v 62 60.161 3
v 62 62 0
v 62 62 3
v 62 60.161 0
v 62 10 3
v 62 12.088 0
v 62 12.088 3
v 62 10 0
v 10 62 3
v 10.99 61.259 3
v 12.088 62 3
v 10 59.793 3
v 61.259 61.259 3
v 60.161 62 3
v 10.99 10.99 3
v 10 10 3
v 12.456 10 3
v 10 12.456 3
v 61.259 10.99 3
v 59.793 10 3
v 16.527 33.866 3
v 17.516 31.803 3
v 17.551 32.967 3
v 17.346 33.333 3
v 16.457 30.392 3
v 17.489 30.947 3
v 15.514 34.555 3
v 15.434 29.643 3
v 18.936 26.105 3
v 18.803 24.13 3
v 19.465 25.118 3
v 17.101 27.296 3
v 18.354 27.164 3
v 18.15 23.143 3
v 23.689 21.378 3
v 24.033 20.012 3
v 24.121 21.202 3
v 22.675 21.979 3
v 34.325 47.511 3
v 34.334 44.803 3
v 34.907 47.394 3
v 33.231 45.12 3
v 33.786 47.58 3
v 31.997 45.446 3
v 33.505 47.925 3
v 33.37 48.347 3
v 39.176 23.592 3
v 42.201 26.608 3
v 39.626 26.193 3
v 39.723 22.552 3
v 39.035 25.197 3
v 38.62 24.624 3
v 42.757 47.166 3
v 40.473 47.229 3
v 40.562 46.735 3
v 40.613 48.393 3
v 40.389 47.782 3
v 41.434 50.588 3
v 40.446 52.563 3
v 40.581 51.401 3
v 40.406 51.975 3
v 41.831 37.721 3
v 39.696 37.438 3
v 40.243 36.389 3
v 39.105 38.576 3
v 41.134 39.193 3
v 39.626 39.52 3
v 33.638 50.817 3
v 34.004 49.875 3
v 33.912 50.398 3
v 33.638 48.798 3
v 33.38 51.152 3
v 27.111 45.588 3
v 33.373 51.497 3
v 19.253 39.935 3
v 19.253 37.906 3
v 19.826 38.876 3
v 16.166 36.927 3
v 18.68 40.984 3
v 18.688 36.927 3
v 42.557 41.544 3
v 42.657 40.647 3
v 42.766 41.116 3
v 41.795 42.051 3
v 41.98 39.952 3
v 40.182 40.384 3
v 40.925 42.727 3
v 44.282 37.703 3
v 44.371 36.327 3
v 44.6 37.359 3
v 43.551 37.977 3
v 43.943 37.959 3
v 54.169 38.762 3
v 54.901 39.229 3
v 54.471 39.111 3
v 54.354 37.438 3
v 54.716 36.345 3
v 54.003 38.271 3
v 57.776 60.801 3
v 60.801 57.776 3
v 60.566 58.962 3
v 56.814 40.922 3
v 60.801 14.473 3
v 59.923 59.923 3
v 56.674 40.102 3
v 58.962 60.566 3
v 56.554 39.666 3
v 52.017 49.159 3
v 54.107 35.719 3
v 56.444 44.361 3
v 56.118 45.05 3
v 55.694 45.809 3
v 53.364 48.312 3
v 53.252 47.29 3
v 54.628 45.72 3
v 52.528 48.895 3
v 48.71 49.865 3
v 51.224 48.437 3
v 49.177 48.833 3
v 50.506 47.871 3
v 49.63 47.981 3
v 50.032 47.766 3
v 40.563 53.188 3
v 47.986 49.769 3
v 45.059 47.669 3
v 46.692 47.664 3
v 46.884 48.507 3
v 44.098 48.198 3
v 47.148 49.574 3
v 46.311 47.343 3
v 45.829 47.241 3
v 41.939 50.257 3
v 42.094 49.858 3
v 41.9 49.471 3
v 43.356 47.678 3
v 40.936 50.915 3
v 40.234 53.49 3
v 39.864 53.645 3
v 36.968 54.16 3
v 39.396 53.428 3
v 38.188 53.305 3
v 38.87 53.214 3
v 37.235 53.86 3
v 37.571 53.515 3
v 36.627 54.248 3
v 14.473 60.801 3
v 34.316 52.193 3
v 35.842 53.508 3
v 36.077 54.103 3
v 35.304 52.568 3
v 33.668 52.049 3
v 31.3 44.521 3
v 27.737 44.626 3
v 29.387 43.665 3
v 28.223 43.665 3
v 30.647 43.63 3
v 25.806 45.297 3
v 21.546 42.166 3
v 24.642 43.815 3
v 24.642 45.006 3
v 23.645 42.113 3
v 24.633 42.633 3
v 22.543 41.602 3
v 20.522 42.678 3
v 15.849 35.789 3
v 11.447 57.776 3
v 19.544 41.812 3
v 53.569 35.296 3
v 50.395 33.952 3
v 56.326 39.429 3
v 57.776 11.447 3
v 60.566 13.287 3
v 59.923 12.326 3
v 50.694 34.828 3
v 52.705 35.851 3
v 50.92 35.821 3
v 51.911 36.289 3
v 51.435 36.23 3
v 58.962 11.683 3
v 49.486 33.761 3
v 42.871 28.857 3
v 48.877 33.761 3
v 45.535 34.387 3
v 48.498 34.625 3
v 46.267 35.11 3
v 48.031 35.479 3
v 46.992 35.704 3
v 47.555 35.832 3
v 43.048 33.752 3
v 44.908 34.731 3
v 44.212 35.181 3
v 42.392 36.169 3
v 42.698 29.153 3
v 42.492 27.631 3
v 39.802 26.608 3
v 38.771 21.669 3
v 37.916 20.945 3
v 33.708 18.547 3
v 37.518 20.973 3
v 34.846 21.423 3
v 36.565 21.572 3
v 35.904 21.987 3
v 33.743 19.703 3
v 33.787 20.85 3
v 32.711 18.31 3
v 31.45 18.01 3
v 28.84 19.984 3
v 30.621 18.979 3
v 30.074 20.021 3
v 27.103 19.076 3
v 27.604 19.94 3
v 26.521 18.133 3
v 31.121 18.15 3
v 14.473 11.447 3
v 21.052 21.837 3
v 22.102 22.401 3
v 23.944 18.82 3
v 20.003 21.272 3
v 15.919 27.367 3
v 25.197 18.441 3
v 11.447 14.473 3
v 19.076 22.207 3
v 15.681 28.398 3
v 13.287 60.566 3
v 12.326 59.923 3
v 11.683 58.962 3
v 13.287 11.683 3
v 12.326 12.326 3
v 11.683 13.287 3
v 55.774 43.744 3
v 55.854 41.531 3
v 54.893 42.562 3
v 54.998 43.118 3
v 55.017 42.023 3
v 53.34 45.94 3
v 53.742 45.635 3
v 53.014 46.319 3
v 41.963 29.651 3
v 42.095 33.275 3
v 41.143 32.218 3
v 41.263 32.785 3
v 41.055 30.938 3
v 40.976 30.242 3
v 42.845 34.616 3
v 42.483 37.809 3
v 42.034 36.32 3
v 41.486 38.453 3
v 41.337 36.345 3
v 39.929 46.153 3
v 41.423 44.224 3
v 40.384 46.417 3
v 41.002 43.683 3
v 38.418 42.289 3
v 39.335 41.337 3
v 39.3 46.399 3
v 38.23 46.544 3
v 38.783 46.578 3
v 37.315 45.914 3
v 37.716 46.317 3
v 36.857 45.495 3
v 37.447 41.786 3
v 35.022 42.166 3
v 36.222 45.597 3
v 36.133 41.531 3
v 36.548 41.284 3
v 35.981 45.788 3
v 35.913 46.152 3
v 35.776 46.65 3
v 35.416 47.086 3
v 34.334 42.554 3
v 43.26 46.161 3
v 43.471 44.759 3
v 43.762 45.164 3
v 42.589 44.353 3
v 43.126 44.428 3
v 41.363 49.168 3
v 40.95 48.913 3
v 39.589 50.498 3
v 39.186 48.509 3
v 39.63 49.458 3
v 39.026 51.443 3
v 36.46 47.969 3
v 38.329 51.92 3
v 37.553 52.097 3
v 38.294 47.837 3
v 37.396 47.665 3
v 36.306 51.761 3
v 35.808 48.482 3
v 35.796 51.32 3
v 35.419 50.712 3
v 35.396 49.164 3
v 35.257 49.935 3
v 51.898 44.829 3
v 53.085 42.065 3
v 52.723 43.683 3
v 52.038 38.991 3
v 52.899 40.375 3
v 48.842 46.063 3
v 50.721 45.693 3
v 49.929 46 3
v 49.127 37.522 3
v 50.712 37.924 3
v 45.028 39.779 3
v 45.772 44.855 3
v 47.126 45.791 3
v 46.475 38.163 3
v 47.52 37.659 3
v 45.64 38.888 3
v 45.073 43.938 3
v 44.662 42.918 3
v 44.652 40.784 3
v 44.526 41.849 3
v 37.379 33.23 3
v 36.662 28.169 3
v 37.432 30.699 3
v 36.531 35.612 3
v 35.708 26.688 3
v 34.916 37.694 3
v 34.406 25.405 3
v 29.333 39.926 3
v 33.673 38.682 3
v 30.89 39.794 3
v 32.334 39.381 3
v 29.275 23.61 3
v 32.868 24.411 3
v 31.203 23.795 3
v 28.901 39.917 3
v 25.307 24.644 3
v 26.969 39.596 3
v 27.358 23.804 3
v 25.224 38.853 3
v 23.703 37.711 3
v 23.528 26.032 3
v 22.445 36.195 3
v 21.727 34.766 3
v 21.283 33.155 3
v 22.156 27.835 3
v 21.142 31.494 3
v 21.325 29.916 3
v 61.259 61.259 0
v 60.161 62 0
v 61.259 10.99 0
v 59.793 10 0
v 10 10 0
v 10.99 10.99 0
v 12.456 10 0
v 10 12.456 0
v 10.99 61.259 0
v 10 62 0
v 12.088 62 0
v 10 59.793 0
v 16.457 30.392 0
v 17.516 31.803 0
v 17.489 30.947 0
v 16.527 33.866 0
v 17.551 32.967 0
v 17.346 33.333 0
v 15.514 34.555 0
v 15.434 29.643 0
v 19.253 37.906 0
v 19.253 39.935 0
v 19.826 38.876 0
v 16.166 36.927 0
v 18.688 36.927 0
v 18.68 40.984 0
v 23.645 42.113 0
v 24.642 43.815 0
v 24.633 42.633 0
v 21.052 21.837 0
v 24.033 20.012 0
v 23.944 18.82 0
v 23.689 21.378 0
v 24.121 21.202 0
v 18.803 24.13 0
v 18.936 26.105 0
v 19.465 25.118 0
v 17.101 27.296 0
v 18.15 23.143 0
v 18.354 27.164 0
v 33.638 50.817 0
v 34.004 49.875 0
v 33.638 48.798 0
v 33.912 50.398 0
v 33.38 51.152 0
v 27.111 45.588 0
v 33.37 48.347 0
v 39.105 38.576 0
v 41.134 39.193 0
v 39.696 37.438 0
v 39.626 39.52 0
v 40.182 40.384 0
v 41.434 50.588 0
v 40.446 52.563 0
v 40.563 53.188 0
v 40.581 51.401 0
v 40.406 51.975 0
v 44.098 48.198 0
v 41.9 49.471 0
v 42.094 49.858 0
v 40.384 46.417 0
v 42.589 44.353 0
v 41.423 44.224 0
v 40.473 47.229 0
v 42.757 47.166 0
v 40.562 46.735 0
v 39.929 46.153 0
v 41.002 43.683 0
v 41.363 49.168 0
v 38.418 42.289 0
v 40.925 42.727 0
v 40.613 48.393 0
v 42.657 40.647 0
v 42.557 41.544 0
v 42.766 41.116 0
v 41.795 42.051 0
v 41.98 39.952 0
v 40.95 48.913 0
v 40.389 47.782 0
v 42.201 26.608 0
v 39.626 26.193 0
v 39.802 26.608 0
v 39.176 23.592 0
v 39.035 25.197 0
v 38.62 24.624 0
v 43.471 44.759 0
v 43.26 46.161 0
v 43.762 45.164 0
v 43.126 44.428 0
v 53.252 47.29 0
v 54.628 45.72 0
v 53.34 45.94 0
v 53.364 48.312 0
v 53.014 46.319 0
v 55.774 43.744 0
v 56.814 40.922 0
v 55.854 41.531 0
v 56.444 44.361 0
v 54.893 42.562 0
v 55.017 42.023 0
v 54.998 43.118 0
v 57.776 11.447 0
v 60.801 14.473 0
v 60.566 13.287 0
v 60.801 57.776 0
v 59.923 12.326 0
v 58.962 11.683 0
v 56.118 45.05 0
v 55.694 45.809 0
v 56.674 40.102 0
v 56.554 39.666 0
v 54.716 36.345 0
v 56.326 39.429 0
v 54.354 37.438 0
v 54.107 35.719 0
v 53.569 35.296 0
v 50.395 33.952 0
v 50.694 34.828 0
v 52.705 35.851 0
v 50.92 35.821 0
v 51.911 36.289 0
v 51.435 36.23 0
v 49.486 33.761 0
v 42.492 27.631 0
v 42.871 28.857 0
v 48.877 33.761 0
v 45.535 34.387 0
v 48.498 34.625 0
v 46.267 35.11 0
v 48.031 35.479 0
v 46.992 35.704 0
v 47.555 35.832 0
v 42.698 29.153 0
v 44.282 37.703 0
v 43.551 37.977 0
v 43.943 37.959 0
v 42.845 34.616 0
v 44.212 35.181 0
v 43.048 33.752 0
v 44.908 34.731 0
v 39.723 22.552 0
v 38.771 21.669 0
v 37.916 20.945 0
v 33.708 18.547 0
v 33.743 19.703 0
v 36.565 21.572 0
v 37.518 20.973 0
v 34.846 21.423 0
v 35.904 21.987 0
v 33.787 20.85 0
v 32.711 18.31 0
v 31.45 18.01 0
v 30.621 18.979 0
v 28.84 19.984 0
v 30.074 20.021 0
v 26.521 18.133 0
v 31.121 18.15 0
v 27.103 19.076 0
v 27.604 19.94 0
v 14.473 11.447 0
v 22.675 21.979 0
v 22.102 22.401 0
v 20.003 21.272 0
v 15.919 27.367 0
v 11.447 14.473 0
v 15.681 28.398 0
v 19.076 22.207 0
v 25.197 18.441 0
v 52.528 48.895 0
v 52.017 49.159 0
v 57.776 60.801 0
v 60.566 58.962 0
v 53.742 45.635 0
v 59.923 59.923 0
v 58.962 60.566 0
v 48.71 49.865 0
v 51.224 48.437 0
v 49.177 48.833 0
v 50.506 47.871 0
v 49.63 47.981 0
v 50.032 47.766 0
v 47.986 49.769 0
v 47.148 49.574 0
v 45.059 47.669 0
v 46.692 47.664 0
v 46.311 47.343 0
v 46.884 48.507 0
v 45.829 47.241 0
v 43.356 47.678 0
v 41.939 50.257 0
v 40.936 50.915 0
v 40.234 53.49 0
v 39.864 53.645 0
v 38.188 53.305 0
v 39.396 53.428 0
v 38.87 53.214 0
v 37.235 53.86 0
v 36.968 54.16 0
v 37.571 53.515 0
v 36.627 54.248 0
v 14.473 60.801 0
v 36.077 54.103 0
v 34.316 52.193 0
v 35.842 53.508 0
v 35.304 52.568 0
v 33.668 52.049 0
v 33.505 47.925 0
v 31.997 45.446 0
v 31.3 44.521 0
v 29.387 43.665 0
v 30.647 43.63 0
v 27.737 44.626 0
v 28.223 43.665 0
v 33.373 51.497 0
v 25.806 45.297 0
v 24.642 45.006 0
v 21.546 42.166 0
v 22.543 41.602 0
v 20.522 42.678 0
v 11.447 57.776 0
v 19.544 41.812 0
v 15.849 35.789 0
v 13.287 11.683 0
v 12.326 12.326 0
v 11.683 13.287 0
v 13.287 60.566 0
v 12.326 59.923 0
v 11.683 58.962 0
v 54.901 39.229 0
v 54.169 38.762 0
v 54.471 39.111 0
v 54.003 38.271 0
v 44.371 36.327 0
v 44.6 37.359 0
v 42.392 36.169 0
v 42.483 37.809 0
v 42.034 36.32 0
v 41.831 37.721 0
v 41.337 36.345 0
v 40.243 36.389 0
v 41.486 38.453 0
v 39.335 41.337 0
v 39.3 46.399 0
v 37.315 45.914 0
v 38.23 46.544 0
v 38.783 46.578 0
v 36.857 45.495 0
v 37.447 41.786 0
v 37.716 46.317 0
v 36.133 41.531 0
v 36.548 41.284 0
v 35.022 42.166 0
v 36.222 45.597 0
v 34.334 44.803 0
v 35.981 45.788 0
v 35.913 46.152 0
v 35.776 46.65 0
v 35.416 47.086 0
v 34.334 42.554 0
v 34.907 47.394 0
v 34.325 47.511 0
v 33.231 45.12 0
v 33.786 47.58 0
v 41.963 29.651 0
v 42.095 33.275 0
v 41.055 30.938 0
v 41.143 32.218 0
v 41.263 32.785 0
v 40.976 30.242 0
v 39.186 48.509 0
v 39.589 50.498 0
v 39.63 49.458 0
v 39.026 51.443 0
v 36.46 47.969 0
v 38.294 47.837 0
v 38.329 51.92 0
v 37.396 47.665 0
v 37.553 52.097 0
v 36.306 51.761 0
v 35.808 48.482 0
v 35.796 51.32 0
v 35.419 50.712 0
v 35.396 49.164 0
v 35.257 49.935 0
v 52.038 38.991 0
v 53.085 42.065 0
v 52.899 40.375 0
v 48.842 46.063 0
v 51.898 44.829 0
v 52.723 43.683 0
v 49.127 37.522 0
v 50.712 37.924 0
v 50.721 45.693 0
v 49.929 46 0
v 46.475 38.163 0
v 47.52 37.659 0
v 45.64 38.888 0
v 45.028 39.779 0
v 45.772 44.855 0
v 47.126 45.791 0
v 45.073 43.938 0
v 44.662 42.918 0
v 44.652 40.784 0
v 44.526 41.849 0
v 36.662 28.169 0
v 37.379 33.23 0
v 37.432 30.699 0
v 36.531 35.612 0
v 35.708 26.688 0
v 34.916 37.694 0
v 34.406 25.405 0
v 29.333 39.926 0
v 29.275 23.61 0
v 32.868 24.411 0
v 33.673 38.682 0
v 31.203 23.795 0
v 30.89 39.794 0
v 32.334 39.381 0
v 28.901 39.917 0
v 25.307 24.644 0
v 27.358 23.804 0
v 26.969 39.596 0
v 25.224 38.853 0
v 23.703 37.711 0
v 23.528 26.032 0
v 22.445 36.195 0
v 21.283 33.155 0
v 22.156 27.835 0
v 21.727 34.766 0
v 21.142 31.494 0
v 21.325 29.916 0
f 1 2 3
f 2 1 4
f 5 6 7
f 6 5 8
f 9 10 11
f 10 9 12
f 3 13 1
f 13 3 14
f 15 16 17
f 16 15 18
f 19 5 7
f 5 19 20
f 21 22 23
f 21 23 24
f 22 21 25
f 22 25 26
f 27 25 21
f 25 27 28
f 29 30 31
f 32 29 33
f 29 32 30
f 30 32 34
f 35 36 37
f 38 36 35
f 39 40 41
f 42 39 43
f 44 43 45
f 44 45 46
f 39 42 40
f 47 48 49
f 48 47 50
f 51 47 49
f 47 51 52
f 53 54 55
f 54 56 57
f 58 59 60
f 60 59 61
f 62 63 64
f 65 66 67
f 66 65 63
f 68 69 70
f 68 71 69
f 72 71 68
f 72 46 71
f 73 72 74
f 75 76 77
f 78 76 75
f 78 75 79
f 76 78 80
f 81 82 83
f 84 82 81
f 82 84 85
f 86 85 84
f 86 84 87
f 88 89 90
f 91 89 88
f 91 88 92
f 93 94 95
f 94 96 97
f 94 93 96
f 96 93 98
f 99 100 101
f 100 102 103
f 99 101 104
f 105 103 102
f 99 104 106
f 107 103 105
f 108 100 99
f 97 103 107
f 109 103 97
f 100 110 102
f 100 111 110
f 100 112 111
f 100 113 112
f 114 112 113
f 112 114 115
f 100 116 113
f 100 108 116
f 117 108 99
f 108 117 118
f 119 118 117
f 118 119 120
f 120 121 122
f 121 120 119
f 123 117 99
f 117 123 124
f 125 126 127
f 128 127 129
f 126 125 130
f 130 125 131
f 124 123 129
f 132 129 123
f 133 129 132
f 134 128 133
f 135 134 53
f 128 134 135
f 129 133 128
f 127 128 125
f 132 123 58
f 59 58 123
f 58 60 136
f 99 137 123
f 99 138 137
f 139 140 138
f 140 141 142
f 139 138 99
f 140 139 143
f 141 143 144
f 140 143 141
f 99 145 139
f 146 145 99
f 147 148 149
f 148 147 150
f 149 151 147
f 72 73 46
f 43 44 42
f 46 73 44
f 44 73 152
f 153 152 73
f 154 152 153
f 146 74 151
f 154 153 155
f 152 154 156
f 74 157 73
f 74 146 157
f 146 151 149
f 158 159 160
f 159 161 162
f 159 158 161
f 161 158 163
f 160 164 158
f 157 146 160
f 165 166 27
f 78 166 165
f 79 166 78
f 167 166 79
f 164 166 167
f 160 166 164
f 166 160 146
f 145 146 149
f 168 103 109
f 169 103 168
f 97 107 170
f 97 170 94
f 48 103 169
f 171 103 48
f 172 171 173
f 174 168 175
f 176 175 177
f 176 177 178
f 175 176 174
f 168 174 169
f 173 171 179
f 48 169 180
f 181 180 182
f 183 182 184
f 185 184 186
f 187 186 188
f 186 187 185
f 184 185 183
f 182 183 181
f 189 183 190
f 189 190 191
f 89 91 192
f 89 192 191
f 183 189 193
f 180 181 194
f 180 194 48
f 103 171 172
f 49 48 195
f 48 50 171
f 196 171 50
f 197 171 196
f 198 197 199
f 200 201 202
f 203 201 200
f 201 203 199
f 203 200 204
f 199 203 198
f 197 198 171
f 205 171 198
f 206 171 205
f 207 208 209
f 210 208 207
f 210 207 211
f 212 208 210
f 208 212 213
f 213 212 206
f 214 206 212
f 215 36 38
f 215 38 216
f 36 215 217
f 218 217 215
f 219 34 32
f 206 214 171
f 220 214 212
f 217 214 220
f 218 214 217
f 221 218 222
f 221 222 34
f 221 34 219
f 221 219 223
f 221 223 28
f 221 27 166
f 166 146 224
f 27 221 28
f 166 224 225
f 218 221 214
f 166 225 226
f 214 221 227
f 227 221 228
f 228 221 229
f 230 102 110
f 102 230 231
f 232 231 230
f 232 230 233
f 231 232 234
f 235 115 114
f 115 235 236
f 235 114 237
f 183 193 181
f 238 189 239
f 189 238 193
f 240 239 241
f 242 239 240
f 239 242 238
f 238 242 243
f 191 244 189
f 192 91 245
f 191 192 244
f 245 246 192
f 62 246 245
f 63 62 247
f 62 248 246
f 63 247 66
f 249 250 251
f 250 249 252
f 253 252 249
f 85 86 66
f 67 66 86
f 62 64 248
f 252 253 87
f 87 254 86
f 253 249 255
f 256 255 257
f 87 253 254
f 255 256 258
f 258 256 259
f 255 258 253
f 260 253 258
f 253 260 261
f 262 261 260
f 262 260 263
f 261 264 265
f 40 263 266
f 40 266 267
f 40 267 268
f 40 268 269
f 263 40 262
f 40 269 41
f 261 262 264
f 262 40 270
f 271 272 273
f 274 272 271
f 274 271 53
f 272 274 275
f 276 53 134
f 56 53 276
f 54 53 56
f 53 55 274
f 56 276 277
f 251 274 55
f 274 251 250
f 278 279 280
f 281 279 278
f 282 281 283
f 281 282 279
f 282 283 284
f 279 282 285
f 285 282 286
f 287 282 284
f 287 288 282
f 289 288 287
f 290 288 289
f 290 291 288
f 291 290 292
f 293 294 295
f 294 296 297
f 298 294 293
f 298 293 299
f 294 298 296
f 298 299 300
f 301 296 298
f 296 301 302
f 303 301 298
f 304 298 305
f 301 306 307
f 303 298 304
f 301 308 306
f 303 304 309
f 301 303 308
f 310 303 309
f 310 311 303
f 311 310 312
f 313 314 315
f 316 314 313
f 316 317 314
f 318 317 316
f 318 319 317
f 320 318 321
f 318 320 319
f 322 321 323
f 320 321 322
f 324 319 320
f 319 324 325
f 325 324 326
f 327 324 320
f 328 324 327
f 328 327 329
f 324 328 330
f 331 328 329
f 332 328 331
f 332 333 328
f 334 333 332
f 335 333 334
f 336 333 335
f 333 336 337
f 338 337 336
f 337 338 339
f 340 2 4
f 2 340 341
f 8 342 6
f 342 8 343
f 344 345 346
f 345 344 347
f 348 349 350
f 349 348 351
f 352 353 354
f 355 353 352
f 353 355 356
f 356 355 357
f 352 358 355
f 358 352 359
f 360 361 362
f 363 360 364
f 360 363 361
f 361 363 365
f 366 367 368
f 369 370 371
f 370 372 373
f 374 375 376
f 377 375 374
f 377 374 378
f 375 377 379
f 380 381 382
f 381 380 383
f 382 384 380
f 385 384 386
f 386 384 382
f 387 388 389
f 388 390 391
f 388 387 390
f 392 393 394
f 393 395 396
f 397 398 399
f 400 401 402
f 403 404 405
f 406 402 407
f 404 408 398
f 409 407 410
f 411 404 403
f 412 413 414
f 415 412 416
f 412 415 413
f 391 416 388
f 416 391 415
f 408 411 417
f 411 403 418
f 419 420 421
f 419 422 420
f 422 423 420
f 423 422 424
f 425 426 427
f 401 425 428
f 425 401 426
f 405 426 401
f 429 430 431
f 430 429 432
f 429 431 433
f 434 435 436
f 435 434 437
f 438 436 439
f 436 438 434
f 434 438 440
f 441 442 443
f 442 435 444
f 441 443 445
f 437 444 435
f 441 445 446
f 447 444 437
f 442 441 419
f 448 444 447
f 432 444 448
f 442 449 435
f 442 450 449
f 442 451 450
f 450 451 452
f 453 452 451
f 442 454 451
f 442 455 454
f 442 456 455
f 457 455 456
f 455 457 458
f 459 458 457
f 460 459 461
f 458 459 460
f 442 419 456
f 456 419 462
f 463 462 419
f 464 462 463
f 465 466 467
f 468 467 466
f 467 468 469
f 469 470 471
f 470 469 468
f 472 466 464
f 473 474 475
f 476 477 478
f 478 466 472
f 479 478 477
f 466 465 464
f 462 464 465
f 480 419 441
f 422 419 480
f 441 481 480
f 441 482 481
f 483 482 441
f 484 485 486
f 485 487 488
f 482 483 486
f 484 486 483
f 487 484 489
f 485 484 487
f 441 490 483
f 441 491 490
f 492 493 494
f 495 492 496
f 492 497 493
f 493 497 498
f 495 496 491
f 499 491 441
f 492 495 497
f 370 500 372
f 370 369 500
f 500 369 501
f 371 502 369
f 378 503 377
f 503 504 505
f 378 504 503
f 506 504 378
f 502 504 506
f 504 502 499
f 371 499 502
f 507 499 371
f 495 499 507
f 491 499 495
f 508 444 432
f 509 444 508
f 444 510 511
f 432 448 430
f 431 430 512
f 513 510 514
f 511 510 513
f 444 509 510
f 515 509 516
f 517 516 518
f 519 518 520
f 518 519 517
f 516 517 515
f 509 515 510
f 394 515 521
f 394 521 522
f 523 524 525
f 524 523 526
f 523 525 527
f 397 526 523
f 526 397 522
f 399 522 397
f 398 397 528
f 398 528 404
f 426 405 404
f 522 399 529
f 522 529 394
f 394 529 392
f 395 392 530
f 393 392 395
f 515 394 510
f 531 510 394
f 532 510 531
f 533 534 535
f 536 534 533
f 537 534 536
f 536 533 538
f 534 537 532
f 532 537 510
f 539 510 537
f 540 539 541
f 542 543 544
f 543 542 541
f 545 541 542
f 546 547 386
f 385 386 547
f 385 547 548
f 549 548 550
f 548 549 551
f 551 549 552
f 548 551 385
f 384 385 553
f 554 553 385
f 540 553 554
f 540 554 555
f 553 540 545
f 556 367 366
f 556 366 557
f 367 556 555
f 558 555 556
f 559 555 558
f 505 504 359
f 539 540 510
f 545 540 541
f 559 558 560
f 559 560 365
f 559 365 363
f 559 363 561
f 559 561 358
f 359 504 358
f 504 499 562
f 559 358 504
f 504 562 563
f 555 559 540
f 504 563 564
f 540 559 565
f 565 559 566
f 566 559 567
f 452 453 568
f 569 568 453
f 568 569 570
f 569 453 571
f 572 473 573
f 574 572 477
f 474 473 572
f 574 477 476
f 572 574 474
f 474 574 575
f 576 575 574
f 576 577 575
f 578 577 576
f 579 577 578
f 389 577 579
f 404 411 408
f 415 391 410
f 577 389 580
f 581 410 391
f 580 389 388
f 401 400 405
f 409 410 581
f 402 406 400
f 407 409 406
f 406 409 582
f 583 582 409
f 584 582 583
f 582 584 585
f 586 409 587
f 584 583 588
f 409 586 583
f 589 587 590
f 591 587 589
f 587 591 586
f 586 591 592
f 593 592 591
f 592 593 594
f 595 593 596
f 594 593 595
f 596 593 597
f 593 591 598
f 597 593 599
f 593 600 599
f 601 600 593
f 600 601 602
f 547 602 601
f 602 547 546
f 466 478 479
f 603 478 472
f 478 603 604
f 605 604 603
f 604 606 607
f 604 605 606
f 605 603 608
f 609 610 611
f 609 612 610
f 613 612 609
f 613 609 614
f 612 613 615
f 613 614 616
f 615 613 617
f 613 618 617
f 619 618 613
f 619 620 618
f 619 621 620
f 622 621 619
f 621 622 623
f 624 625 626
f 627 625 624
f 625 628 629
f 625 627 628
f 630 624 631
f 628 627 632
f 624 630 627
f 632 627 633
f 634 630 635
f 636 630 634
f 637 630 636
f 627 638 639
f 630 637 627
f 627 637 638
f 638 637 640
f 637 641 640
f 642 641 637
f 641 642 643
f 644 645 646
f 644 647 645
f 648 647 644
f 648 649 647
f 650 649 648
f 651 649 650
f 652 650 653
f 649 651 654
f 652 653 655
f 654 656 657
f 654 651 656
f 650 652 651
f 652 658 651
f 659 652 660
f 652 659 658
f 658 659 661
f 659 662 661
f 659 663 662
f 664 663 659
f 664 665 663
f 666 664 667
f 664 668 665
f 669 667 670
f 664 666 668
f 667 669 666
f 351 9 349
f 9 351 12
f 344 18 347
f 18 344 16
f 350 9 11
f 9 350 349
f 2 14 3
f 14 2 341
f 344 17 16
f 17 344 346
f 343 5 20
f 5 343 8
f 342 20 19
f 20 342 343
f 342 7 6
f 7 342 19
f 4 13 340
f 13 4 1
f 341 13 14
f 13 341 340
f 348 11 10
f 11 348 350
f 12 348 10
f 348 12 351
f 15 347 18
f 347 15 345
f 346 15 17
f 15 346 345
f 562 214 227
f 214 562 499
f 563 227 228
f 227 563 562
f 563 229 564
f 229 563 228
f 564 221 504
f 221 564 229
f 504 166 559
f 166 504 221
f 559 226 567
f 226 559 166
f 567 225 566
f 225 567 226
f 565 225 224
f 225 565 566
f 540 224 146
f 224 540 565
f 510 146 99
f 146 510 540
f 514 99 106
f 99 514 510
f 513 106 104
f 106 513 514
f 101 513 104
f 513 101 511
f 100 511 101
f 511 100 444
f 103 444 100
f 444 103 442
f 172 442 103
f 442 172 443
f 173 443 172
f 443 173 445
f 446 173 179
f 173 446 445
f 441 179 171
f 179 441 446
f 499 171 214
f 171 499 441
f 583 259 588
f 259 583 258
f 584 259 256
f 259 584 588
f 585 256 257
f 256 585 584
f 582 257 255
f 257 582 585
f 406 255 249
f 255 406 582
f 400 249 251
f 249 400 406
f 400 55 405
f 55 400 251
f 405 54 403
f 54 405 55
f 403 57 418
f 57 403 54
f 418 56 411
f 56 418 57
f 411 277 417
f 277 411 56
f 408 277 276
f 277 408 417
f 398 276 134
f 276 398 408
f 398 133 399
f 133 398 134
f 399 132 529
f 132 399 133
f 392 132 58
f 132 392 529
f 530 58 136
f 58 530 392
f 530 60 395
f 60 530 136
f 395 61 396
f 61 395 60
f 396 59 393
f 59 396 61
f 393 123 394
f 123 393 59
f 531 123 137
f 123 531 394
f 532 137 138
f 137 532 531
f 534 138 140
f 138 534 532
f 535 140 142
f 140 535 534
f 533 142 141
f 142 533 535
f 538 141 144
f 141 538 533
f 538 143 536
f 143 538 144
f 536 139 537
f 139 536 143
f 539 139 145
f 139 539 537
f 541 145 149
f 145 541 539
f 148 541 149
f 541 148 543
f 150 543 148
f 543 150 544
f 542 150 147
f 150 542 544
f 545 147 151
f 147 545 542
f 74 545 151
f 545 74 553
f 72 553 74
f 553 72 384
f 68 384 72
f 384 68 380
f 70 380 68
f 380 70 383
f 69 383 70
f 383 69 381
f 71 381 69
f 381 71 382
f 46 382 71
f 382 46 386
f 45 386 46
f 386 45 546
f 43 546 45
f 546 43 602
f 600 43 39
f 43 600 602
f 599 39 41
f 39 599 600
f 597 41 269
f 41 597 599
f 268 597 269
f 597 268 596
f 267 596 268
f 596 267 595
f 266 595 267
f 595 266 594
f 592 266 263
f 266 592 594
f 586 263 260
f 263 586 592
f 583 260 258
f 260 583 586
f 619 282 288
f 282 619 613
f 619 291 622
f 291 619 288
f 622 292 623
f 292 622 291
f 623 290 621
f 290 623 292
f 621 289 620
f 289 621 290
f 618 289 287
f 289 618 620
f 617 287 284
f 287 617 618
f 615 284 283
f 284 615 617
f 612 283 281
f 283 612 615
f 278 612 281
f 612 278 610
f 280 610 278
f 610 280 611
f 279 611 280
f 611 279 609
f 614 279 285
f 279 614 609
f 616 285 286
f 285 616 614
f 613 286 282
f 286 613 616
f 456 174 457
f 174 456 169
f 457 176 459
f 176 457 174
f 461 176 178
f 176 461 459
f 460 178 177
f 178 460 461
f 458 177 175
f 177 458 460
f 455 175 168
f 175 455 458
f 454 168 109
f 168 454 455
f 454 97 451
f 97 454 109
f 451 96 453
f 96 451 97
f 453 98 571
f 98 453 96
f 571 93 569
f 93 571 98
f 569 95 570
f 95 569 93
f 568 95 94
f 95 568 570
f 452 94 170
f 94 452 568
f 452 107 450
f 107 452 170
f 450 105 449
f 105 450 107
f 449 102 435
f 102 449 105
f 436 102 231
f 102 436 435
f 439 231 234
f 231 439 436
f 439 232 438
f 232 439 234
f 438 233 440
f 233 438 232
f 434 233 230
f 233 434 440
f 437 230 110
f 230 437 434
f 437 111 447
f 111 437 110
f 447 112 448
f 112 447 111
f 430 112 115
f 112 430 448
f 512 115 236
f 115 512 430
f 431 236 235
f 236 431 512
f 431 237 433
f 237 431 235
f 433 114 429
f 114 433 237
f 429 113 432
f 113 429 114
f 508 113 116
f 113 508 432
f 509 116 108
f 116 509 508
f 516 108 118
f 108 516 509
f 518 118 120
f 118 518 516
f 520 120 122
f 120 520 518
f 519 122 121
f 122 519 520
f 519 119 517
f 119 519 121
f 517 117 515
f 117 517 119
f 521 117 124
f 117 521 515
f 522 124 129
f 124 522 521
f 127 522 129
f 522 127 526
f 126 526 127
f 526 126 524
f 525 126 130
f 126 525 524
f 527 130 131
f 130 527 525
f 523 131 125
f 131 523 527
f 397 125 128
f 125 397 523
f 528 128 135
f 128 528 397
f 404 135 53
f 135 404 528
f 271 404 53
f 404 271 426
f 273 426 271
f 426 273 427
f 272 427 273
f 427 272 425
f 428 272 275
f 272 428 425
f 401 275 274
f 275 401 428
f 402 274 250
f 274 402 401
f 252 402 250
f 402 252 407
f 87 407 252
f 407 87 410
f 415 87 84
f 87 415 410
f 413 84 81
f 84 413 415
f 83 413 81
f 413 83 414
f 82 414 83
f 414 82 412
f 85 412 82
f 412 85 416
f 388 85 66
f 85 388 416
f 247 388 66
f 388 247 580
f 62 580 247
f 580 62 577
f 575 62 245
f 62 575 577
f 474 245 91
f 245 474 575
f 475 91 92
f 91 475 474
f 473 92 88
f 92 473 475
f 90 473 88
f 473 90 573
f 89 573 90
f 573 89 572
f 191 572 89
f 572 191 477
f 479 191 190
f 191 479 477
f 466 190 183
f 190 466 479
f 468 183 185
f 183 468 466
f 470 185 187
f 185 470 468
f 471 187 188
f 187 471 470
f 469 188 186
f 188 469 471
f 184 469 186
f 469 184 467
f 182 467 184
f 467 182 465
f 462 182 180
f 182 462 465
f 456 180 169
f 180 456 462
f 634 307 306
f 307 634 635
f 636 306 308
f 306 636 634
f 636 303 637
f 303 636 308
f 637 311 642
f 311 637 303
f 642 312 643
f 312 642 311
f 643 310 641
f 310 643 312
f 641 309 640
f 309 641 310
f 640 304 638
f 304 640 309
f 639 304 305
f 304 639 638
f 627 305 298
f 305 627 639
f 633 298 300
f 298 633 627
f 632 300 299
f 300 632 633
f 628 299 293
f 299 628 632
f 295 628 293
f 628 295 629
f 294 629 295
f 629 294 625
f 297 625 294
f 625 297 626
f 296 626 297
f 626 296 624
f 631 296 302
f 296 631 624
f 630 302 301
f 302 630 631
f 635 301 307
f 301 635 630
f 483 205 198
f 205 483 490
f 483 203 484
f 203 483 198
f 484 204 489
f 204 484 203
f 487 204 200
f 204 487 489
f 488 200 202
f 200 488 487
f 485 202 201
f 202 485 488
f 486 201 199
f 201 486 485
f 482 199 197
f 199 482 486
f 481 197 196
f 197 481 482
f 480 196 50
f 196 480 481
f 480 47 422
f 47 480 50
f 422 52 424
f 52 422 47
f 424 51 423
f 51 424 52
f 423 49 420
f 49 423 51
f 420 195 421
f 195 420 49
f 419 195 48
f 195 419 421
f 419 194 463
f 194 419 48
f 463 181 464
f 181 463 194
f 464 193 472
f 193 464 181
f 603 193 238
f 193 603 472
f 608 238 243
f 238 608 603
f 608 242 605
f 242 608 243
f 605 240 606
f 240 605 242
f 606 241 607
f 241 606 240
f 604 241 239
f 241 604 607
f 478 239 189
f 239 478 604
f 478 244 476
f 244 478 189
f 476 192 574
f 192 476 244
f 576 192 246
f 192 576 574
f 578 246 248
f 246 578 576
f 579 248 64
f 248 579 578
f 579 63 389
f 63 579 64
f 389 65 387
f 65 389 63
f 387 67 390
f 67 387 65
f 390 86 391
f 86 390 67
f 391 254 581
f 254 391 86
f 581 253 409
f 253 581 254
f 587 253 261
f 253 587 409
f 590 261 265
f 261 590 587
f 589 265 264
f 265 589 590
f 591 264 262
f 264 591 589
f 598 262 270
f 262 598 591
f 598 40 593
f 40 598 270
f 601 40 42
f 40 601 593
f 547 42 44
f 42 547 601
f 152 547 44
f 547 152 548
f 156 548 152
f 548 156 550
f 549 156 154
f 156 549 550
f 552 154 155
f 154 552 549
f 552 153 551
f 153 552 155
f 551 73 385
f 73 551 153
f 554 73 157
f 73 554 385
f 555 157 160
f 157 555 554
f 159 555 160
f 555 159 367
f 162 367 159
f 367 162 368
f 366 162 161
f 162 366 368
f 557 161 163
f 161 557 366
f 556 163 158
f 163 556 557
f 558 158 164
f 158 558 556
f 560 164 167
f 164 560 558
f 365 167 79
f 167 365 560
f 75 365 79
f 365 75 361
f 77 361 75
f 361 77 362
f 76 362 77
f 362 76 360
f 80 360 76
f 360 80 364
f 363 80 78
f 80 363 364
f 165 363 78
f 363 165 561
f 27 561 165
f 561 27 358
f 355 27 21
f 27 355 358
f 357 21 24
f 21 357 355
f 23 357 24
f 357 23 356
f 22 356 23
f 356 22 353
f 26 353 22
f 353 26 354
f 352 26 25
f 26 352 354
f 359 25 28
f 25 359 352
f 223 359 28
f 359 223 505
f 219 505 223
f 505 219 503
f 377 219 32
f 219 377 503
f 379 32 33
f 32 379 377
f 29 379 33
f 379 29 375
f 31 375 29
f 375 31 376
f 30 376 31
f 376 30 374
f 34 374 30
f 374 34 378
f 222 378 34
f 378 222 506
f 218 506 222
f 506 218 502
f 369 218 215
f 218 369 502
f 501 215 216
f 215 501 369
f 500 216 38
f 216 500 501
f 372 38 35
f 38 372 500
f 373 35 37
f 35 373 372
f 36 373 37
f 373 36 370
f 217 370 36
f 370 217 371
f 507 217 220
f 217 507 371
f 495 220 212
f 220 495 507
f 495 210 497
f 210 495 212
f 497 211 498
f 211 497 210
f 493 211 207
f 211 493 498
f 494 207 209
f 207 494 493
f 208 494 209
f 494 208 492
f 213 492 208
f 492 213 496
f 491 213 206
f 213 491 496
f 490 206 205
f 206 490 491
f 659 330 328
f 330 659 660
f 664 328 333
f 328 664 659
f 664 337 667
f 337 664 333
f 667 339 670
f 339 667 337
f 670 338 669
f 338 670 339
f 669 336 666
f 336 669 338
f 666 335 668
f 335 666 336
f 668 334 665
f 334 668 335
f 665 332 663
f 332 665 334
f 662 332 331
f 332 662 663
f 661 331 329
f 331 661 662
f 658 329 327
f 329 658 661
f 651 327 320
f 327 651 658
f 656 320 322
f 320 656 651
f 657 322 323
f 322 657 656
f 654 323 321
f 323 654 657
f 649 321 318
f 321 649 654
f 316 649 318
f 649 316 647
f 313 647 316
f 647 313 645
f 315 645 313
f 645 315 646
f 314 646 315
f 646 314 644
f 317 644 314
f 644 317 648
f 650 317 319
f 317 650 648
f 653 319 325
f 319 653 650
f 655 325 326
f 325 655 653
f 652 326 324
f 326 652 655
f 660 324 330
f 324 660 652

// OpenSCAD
difference() {
	translate([10,10,0]) cube([52,52,3]);
	linear_extrude(height = 3) {
	  import("fabhack-h.dxf");
	}
}
